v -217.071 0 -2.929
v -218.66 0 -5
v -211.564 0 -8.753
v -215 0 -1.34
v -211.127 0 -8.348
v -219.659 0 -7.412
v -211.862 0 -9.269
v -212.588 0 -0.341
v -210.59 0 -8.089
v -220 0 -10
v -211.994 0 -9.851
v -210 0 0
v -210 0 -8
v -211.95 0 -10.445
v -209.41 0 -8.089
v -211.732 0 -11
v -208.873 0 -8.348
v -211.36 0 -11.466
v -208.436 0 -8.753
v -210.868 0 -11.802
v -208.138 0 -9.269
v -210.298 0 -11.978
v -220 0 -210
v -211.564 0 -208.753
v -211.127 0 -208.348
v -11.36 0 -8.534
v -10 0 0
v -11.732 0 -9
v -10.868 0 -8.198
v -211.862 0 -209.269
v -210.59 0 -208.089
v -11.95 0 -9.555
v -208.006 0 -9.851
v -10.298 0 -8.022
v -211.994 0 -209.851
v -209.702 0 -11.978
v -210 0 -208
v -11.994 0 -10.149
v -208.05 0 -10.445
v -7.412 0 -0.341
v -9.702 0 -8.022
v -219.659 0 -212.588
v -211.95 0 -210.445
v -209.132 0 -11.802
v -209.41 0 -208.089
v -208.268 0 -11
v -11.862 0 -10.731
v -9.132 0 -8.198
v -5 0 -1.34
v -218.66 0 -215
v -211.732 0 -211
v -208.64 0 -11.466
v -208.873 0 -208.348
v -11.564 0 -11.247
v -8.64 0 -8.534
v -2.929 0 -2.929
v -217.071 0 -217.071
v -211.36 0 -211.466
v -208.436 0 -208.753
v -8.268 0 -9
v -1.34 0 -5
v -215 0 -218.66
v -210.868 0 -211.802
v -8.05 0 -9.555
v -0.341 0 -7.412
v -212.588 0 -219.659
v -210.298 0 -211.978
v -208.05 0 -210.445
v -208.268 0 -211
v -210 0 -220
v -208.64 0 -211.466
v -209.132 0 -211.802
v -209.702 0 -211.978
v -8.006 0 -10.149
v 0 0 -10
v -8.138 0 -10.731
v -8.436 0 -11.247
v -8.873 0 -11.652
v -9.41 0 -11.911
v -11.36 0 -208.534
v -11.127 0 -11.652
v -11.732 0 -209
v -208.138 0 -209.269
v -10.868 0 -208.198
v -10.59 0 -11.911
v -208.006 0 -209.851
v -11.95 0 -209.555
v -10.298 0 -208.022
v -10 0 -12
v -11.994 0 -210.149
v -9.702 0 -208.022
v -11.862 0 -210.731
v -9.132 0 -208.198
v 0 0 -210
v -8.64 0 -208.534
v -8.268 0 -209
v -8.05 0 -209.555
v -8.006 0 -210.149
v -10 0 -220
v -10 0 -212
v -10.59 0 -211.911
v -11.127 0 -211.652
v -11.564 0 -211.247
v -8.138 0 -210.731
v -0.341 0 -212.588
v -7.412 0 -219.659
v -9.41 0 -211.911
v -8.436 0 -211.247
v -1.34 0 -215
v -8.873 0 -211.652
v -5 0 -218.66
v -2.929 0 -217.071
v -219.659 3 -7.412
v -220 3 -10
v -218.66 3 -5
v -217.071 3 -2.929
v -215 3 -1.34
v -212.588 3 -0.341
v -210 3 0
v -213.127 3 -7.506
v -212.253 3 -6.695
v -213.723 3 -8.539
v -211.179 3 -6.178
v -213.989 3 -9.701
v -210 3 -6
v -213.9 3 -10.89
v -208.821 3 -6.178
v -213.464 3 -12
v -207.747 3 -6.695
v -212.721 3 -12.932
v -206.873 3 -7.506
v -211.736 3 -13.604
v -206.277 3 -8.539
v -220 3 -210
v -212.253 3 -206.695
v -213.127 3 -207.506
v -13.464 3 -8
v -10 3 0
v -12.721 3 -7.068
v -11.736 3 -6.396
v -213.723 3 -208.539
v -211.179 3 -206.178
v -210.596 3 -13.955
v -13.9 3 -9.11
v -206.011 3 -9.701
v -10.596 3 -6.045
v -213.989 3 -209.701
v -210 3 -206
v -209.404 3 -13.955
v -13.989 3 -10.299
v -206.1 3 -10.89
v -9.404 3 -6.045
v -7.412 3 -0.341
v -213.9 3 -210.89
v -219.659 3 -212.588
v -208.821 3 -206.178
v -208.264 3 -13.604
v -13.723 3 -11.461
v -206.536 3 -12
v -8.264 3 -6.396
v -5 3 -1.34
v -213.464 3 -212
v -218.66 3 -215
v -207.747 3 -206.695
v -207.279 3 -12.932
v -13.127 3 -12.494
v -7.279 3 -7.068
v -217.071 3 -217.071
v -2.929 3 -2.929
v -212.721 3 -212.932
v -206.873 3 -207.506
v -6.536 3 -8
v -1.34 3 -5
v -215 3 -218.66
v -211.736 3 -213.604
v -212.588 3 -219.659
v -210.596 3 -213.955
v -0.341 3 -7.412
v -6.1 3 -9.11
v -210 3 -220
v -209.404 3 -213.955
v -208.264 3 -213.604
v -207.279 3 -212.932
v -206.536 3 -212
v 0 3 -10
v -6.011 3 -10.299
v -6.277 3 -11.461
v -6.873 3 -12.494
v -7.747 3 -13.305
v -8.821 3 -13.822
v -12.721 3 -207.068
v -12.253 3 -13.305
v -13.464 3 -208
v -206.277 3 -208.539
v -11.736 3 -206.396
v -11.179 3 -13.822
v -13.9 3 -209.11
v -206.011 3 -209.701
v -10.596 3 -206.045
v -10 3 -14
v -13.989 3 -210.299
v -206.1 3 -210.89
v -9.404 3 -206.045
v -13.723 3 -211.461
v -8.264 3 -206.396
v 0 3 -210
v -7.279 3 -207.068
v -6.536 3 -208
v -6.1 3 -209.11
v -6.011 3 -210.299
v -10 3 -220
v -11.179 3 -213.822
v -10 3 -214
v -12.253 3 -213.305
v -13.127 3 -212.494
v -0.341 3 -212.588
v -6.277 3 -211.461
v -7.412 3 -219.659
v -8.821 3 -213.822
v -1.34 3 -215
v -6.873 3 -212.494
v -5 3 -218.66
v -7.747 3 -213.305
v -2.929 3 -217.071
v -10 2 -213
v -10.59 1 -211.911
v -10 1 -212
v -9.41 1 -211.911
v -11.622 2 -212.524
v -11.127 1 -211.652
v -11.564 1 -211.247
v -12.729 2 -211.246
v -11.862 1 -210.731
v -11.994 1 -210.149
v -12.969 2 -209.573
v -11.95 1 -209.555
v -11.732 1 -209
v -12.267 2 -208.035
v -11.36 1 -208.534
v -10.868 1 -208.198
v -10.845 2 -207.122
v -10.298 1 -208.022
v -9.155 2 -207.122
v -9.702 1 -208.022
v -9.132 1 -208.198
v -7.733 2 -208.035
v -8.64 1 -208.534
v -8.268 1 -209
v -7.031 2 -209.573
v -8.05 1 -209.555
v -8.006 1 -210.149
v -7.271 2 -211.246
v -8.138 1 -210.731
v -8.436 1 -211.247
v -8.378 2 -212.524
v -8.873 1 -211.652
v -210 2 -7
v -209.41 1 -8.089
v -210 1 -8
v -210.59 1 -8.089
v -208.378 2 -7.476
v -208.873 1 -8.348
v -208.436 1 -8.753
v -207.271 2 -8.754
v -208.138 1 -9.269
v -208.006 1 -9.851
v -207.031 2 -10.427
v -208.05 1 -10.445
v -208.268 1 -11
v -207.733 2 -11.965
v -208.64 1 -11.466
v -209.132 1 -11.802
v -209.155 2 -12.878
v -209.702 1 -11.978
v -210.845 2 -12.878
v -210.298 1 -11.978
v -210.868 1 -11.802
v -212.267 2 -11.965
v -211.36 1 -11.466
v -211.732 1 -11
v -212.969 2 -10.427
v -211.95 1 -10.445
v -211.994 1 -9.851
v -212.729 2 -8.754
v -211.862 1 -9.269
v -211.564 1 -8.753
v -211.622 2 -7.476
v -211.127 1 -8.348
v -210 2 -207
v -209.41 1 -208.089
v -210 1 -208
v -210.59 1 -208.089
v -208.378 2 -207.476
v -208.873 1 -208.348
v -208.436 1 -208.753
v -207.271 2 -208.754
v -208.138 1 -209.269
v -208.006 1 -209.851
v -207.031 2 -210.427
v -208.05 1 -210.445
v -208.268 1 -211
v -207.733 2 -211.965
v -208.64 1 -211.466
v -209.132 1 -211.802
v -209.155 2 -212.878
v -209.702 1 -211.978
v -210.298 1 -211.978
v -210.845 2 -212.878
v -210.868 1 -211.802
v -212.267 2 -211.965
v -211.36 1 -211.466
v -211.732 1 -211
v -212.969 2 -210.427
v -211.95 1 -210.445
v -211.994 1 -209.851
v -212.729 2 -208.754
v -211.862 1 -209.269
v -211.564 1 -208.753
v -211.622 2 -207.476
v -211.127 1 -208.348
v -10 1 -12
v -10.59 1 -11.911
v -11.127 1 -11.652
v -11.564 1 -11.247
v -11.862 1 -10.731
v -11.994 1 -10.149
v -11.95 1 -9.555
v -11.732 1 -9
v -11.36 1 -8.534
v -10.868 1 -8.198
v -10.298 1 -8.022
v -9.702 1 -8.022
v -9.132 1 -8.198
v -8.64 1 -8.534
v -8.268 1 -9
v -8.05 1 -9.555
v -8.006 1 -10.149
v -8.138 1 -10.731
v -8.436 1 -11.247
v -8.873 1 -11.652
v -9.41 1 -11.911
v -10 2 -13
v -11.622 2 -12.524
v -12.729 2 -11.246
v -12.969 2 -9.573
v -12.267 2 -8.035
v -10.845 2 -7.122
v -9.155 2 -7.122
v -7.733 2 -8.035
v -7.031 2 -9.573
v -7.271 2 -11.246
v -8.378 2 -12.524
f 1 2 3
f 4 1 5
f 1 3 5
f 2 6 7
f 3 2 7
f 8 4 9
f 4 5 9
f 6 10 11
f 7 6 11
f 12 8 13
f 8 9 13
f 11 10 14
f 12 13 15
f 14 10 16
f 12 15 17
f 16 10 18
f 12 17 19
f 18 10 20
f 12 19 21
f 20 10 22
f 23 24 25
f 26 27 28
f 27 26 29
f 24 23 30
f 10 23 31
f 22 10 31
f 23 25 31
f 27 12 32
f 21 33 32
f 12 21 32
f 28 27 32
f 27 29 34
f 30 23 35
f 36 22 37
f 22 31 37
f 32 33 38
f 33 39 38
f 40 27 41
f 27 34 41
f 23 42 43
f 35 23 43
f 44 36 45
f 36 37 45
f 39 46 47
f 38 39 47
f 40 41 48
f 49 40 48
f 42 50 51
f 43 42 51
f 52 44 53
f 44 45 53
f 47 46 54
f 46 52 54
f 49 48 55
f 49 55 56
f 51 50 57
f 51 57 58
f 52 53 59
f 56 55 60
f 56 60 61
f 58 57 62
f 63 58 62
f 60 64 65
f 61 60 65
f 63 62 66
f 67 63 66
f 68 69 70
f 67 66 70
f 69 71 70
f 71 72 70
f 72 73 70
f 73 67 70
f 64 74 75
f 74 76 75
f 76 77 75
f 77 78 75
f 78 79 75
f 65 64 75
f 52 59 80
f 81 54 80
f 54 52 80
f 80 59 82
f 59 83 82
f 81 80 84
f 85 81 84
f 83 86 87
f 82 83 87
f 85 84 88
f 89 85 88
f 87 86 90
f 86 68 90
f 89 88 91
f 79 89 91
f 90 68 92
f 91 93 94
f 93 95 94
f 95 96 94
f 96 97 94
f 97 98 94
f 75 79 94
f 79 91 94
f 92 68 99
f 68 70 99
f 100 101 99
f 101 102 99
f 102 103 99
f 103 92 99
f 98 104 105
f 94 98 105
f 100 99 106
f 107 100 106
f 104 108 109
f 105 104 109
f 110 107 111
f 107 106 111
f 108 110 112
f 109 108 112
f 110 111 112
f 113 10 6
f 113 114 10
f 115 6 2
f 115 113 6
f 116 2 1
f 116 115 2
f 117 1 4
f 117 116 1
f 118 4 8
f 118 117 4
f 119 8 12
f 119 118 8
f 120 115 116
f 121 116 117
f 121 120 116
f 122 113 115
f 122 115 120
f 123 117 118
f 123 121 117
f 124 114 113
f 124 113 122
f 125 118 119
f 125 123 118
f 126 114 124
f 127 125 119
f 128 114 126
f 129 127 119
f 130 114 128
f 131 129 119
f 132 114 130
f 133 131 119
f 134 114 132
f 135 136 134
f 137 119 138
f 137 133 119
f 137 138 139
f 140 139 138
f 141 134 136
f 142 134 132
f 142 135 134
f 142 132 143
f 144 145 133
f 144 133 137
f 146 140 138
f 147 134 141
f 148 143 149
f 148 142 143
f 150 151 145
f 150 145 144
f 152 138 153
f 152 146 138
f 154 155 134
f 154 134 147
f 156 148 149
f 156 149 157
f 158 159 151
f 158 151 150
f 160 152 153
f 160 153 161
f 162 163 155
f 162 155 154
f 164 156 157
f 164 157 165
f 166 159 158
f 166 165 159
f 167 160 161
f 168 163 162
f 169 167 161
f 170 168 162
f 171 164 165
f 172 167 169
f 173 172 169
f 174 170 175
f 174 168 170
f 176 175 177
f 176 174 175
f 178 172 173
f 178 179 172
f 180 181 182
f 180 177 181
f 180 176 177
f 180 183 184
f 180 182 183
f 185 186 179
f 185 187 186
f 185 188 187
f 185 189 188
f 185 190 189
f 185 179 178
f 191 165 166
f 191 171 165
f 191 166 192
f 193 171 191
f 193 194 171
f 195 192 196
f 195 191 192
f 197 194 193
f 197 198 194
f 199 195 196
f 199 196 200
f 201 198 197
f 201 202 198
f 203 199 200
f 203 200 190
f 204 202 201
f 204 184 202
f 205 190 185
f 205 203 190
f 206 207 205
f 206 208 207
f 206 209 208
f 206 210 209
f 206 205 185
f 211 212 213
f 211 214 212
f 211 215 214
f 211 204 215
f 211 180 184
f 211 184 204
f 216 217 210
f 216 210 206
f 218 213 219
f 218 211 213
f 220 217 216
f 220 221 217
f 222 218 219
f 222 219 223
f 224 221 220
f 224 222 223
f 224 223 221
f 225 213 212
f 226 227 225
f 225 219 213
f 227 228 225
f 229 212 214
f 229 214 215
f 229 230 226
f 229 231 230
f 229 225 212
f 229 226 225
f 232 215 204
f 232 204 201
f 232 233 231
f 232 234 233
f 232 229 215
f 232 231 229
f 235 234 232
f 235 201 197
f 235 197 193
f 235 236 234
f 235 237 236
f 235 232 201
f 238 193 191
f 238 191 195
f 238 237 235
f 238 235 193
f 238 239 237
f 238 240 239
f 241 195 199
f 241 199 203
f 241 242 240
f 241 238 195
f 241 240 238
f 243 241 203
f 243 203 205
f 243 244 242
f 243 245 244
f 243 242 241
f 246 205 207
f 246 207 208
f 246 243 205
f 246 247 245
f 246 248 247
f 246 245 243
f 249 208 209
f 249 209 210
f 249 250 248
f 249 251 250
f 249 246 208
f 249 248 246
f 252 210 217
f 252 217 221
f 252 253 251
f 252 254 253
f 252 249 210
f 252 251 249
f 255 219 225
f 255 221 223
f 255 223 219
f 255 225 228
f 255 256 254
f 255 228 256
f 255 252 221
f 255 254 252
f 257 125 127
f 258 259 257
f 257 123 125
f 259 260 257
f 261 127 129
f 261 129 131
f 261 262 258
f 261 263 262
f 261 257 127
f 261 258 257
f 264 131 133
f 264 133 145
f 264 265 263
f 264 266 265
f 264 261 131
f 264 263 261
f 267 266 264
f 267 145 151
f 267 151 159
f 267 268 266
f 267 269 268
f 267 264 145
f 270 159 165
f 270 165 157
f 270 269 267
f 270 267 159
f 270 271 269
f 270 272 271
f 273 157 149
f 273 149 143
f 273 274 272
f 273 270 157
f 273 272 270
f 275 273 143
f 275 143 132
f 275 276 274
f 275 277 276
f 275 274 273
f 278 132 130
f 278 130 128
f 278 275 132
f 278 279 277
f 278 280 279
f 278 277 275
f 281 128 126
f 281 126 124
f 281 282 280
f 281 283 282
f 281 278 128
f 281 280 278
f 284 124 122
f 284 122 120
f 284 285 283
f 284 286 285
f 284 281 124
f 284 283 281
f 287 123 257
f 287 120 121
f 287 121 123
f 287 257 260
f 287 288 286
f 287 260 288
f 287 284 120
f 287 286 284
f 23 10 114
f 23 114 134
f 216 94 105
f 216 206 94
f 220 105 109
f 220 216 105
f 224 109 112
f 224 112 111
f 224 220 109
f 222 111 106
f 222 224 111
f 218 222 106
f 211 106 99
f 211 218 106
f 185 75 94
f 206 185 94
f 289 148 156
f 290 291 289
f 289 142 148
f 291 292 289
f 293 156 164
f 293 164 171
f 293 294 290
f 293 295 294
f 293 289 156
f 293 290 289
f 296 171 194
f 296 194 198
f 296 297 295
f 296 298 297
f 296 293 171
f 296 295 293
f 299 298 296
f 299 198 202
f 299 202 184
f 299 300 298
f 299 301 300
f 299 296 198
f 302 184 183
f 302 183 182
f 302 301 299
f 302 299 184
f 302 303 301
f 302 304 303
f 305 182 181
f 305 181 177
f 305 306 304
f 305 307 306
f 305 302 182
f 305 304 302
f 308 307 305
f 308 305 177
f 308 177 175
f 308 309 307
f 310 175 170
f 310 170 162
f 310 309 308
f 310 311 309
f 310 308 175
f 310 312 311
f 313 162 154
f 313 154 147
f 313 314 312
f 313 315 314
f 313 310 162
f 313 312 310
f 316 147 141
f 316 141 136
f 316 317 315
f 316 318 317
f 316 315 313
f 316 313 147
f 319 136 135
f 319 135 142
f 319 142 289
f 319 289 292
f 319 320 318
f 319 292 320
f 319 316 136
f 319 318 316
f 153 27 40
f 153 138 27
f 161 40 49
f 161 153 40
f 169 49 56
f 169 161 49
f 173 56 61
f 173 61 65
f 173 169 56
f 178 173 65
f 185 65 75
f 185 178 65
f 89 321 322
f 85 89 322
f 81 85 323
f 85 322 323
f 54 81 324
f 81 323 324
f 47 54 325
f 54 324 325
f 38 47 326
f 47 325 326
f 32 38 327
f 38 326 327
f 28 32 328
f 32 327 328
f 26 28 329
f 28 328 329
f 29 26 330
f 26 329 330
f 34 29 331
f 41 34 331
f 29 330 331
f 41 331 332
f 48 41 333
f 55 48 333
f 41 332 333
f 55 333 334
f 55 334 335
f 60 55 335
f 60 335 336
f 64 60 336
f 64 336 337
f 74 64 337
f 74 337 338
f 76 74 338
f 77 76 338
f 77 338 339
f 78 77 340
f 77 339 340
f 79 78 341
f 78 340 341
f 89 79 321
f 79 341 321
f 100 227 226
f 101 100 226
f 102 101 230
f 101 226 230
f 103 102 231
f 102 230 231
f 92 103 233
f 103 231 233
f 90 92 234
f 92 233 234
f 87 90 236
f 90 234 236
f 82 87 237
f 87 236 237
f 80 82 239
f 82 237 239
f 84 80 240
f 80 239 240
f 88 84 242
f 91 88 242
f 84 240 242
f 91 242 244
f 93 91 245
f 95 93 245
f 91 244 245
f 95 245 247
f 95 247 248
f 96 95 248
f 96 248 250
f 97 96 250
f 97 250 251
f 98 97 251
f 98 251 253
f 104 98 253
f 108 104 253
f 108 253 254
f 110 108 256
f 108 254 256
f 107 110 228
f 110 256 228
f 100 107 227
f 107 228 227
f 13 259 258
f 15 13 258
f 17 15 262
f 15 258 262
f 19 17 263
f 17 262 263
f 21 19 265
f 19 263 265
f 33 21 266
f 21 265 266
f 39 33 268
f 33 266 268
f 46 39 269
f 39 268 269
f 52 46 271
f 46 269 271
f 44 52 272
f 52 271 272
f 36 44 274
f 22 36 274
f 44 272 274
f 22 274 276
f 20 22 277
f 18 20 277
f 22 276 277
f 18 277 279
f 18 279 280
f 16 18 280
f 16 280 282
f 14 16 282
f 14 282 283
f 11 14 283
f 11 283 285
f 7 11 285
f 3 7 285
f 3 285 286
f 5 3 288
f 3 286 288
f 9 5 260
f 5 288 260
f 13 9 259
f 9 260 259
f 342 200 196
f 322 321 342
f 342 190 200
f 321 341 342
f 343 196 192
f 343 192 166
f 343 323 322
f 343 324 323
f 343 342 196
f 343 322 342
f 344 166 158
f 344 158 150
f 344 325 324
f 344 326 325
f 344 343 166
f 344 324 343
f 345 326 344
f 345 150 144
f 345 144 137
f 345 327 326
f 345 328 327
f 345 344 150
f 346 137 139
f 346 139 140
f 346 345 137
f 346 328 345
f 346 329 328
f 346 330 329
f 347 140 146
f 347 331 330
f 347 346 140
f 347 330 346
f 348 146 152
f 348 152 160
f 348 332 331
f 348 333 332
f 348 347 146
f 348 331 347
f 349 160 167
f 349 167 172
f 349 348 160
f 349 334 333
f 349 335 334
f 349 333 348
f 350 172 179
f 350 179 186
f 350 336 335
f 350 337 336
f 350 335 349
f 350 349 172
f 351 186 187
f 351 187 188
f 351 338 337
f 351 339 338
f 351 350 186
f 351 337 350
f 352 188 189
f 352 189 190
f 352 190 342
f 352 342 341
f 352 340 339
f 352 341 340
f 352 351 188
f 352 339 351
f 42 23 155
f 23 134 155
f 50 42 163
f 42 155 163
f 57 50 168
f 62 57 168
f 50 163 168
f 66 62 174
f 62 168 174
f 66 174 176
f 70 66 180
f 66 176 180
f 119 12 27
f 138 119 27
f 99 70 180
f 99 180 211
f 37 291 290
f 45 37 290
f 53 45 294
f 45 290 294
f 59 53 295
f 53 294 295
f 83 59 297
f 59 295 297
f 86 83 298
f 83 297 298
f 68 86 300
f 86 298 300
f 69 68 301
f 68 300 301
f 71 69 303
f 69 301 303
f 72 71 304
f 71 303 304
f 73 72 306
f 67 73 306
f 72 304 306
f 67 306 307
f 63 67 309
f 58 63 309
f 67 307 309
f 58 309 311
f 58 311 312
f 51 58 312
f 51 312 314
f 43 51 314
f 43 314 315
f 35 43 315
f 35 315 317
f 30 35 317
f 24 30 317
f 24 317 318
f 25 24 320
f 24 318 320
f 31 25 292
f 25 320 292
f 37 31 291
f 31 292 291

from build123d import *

# Parameters (mm, degrees)
SKETCH1_W           = 220
SKETCH1_H           = 220
BOSS_EXTRUDE1_DEPTH = 3
FILLET1_R           = 10
SKETCH2_R           = 2
CUT_EXTRUDE1_DEPTH  = 3
CHAMFER1_SIZE       = 2


with BuildPart() as part:
    # Sketch1 → Boss-Extrude1 (new body)
    with BuildSketch(Plane(origin=(0, 0, 0), x_dir=(1, 0, 0), z_dir=(0, 1, 0))):
        with Locations((-110, 110)):
            Rectangle(SKETCH1_W, SKETCH1_H)
    extrude(amount=BOSS_EXTRUDE1_DEPTH)

    # Fillet1
    fillet1_edges = [part.edges().sort_by_distance(p)[0] for p in [
        (0, 1.5, 0),
        (-220, 1.5, 0),
        (-220, 1.5, -220),
        (0, 1.5, -220),
    ]]
    fillet(fillet1_edges, radius=FILLET1_R)

    # Sketch2 → Cut-Extrude1 (cut)
    with BuildSketch(Plane(origin=(0, 3, 0), x_dir=(1, 0, 0), z_dir=(0, 1, 0))):
        with Locations(Location((-210, 210, 0), (0, 0, 270))):
            Circle(SKETCH2_R)
        with Locations(Location((-210, 10, 0), (0, 0, 270))):
            Circle(SKETCH2_R)
        with Locations(Location((-10, 10, 0), (0, 0, 90))):
            Circle(SKETCH2_R)
        with Locations(Location((-10, 210, 0), (0, 0, 90))):
            Circle(SKETCH2_R)
    extrude(amount=-CUT_EXTRUDE1_DEPTH, mode=Mode.SUBTRACT)

    # Chamfer1
    chamfer1_edges = [part.edges().sort_by_distance(p)[0] for p in [
        (-10, 3, -208),
        (-10, 3, -8),
        (-210, 3, -12),
        (-210, 3, -212),
    ]]
    chamfer(chamfer1_edges, length=CHAMFER1_SIZE)


solid = part.part
